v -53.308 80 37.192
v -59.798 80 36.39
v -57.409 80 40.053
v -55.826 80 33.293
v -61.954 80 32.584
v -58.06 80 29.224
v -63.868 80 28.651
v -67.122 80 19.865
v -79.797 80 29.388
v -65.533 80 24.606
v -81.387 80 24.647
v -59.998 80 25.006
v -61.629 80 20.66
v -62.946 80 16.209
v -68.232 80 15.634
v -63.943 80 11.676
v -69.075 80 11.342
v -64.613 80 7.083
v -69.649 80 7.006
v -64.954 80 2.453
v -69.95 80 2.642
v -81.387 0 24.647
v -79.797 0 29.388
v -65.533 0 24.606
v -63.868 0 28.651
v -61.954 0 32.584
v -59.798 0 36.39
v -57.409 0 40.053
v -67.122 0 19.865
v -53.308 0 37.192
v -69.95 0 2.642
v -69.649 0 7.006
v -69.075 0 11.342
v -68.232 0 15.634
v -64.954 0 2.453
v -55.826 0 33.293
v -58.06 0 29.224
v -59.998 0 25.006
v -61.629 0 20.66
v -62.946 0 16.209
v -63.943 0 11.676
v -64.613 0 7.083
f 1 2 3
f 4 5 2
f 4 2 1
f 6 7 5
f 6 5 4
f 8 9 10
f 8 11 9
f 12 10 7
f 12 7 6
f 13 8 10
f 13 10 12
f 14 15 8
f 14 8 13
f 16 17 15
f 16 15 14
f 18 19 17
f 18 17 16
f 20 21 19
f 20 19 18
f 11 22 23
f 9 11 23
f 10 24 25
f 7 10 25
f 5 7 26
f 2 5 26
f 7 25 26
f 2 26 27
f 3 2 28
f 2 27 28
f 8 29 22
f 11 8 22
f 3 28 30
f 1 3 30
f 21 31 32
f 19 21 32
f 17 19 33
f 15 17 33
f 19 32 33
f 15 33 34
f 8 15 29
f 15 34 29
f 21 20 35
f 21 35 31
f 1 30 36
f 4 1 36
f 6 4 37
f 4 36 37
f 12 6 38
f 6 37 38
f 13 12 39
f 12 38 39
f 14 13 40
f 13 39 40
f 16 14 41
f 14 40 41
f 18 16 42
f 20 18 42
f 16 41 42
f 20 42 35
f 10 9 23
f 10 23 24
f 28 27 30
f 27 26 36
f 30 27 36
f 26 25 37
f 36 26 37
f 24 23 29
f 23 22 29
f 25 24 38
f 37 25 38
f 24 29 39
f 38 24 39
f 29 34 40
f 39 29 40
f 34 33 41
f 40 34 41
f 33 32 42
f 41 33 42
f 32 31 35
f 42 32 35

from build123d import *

# Parameters (mm, degrees)
BOSS_EXTRUDE1_DEPTH = 80


with BuildPart() as part:
    # Sketch1 → Boss-Extrude1 (new body)
    with BuildSketch(Plane(origin=(0, 0, 0), x_dir=(1, 0, 0), z_dir=(0, 1, 0))):
        with BuildLine():
            Line((-79.797325403, -29.387699101), (-65.53287479, -24.605737578))
            ThreePointArc((-65.53287479, -24.605737578), (-61.954038815, -32.583693383), (-57.408519486, -40.053238201))
            Line((-57.408519486, -40.053238201), (-53.307910951, -37.192292615))
            ThreePointArc((-53.307910951, -37.192292615), (-61.629140737, -20.660324585), (-64.953686456, -2.453286719))
            Line((-64.953686456, -2.453286719), (-69.950123876, -2.642001082))
            ThreePointArc((-69.950123876, -2.642001082), (-69.075024078, -11.342003731), (-67.122130527, -19.865034445))
            Line((-67.122130527, -19.865034445), (-81.386581141, -24.646995968))
            Line((-81.386581141, -24.646995968), (-79.797325403, -29.387699101))
        make_face()
    extrude(amount=BOSS_EXTRUDE1_DEPTH)


solid = part.part
